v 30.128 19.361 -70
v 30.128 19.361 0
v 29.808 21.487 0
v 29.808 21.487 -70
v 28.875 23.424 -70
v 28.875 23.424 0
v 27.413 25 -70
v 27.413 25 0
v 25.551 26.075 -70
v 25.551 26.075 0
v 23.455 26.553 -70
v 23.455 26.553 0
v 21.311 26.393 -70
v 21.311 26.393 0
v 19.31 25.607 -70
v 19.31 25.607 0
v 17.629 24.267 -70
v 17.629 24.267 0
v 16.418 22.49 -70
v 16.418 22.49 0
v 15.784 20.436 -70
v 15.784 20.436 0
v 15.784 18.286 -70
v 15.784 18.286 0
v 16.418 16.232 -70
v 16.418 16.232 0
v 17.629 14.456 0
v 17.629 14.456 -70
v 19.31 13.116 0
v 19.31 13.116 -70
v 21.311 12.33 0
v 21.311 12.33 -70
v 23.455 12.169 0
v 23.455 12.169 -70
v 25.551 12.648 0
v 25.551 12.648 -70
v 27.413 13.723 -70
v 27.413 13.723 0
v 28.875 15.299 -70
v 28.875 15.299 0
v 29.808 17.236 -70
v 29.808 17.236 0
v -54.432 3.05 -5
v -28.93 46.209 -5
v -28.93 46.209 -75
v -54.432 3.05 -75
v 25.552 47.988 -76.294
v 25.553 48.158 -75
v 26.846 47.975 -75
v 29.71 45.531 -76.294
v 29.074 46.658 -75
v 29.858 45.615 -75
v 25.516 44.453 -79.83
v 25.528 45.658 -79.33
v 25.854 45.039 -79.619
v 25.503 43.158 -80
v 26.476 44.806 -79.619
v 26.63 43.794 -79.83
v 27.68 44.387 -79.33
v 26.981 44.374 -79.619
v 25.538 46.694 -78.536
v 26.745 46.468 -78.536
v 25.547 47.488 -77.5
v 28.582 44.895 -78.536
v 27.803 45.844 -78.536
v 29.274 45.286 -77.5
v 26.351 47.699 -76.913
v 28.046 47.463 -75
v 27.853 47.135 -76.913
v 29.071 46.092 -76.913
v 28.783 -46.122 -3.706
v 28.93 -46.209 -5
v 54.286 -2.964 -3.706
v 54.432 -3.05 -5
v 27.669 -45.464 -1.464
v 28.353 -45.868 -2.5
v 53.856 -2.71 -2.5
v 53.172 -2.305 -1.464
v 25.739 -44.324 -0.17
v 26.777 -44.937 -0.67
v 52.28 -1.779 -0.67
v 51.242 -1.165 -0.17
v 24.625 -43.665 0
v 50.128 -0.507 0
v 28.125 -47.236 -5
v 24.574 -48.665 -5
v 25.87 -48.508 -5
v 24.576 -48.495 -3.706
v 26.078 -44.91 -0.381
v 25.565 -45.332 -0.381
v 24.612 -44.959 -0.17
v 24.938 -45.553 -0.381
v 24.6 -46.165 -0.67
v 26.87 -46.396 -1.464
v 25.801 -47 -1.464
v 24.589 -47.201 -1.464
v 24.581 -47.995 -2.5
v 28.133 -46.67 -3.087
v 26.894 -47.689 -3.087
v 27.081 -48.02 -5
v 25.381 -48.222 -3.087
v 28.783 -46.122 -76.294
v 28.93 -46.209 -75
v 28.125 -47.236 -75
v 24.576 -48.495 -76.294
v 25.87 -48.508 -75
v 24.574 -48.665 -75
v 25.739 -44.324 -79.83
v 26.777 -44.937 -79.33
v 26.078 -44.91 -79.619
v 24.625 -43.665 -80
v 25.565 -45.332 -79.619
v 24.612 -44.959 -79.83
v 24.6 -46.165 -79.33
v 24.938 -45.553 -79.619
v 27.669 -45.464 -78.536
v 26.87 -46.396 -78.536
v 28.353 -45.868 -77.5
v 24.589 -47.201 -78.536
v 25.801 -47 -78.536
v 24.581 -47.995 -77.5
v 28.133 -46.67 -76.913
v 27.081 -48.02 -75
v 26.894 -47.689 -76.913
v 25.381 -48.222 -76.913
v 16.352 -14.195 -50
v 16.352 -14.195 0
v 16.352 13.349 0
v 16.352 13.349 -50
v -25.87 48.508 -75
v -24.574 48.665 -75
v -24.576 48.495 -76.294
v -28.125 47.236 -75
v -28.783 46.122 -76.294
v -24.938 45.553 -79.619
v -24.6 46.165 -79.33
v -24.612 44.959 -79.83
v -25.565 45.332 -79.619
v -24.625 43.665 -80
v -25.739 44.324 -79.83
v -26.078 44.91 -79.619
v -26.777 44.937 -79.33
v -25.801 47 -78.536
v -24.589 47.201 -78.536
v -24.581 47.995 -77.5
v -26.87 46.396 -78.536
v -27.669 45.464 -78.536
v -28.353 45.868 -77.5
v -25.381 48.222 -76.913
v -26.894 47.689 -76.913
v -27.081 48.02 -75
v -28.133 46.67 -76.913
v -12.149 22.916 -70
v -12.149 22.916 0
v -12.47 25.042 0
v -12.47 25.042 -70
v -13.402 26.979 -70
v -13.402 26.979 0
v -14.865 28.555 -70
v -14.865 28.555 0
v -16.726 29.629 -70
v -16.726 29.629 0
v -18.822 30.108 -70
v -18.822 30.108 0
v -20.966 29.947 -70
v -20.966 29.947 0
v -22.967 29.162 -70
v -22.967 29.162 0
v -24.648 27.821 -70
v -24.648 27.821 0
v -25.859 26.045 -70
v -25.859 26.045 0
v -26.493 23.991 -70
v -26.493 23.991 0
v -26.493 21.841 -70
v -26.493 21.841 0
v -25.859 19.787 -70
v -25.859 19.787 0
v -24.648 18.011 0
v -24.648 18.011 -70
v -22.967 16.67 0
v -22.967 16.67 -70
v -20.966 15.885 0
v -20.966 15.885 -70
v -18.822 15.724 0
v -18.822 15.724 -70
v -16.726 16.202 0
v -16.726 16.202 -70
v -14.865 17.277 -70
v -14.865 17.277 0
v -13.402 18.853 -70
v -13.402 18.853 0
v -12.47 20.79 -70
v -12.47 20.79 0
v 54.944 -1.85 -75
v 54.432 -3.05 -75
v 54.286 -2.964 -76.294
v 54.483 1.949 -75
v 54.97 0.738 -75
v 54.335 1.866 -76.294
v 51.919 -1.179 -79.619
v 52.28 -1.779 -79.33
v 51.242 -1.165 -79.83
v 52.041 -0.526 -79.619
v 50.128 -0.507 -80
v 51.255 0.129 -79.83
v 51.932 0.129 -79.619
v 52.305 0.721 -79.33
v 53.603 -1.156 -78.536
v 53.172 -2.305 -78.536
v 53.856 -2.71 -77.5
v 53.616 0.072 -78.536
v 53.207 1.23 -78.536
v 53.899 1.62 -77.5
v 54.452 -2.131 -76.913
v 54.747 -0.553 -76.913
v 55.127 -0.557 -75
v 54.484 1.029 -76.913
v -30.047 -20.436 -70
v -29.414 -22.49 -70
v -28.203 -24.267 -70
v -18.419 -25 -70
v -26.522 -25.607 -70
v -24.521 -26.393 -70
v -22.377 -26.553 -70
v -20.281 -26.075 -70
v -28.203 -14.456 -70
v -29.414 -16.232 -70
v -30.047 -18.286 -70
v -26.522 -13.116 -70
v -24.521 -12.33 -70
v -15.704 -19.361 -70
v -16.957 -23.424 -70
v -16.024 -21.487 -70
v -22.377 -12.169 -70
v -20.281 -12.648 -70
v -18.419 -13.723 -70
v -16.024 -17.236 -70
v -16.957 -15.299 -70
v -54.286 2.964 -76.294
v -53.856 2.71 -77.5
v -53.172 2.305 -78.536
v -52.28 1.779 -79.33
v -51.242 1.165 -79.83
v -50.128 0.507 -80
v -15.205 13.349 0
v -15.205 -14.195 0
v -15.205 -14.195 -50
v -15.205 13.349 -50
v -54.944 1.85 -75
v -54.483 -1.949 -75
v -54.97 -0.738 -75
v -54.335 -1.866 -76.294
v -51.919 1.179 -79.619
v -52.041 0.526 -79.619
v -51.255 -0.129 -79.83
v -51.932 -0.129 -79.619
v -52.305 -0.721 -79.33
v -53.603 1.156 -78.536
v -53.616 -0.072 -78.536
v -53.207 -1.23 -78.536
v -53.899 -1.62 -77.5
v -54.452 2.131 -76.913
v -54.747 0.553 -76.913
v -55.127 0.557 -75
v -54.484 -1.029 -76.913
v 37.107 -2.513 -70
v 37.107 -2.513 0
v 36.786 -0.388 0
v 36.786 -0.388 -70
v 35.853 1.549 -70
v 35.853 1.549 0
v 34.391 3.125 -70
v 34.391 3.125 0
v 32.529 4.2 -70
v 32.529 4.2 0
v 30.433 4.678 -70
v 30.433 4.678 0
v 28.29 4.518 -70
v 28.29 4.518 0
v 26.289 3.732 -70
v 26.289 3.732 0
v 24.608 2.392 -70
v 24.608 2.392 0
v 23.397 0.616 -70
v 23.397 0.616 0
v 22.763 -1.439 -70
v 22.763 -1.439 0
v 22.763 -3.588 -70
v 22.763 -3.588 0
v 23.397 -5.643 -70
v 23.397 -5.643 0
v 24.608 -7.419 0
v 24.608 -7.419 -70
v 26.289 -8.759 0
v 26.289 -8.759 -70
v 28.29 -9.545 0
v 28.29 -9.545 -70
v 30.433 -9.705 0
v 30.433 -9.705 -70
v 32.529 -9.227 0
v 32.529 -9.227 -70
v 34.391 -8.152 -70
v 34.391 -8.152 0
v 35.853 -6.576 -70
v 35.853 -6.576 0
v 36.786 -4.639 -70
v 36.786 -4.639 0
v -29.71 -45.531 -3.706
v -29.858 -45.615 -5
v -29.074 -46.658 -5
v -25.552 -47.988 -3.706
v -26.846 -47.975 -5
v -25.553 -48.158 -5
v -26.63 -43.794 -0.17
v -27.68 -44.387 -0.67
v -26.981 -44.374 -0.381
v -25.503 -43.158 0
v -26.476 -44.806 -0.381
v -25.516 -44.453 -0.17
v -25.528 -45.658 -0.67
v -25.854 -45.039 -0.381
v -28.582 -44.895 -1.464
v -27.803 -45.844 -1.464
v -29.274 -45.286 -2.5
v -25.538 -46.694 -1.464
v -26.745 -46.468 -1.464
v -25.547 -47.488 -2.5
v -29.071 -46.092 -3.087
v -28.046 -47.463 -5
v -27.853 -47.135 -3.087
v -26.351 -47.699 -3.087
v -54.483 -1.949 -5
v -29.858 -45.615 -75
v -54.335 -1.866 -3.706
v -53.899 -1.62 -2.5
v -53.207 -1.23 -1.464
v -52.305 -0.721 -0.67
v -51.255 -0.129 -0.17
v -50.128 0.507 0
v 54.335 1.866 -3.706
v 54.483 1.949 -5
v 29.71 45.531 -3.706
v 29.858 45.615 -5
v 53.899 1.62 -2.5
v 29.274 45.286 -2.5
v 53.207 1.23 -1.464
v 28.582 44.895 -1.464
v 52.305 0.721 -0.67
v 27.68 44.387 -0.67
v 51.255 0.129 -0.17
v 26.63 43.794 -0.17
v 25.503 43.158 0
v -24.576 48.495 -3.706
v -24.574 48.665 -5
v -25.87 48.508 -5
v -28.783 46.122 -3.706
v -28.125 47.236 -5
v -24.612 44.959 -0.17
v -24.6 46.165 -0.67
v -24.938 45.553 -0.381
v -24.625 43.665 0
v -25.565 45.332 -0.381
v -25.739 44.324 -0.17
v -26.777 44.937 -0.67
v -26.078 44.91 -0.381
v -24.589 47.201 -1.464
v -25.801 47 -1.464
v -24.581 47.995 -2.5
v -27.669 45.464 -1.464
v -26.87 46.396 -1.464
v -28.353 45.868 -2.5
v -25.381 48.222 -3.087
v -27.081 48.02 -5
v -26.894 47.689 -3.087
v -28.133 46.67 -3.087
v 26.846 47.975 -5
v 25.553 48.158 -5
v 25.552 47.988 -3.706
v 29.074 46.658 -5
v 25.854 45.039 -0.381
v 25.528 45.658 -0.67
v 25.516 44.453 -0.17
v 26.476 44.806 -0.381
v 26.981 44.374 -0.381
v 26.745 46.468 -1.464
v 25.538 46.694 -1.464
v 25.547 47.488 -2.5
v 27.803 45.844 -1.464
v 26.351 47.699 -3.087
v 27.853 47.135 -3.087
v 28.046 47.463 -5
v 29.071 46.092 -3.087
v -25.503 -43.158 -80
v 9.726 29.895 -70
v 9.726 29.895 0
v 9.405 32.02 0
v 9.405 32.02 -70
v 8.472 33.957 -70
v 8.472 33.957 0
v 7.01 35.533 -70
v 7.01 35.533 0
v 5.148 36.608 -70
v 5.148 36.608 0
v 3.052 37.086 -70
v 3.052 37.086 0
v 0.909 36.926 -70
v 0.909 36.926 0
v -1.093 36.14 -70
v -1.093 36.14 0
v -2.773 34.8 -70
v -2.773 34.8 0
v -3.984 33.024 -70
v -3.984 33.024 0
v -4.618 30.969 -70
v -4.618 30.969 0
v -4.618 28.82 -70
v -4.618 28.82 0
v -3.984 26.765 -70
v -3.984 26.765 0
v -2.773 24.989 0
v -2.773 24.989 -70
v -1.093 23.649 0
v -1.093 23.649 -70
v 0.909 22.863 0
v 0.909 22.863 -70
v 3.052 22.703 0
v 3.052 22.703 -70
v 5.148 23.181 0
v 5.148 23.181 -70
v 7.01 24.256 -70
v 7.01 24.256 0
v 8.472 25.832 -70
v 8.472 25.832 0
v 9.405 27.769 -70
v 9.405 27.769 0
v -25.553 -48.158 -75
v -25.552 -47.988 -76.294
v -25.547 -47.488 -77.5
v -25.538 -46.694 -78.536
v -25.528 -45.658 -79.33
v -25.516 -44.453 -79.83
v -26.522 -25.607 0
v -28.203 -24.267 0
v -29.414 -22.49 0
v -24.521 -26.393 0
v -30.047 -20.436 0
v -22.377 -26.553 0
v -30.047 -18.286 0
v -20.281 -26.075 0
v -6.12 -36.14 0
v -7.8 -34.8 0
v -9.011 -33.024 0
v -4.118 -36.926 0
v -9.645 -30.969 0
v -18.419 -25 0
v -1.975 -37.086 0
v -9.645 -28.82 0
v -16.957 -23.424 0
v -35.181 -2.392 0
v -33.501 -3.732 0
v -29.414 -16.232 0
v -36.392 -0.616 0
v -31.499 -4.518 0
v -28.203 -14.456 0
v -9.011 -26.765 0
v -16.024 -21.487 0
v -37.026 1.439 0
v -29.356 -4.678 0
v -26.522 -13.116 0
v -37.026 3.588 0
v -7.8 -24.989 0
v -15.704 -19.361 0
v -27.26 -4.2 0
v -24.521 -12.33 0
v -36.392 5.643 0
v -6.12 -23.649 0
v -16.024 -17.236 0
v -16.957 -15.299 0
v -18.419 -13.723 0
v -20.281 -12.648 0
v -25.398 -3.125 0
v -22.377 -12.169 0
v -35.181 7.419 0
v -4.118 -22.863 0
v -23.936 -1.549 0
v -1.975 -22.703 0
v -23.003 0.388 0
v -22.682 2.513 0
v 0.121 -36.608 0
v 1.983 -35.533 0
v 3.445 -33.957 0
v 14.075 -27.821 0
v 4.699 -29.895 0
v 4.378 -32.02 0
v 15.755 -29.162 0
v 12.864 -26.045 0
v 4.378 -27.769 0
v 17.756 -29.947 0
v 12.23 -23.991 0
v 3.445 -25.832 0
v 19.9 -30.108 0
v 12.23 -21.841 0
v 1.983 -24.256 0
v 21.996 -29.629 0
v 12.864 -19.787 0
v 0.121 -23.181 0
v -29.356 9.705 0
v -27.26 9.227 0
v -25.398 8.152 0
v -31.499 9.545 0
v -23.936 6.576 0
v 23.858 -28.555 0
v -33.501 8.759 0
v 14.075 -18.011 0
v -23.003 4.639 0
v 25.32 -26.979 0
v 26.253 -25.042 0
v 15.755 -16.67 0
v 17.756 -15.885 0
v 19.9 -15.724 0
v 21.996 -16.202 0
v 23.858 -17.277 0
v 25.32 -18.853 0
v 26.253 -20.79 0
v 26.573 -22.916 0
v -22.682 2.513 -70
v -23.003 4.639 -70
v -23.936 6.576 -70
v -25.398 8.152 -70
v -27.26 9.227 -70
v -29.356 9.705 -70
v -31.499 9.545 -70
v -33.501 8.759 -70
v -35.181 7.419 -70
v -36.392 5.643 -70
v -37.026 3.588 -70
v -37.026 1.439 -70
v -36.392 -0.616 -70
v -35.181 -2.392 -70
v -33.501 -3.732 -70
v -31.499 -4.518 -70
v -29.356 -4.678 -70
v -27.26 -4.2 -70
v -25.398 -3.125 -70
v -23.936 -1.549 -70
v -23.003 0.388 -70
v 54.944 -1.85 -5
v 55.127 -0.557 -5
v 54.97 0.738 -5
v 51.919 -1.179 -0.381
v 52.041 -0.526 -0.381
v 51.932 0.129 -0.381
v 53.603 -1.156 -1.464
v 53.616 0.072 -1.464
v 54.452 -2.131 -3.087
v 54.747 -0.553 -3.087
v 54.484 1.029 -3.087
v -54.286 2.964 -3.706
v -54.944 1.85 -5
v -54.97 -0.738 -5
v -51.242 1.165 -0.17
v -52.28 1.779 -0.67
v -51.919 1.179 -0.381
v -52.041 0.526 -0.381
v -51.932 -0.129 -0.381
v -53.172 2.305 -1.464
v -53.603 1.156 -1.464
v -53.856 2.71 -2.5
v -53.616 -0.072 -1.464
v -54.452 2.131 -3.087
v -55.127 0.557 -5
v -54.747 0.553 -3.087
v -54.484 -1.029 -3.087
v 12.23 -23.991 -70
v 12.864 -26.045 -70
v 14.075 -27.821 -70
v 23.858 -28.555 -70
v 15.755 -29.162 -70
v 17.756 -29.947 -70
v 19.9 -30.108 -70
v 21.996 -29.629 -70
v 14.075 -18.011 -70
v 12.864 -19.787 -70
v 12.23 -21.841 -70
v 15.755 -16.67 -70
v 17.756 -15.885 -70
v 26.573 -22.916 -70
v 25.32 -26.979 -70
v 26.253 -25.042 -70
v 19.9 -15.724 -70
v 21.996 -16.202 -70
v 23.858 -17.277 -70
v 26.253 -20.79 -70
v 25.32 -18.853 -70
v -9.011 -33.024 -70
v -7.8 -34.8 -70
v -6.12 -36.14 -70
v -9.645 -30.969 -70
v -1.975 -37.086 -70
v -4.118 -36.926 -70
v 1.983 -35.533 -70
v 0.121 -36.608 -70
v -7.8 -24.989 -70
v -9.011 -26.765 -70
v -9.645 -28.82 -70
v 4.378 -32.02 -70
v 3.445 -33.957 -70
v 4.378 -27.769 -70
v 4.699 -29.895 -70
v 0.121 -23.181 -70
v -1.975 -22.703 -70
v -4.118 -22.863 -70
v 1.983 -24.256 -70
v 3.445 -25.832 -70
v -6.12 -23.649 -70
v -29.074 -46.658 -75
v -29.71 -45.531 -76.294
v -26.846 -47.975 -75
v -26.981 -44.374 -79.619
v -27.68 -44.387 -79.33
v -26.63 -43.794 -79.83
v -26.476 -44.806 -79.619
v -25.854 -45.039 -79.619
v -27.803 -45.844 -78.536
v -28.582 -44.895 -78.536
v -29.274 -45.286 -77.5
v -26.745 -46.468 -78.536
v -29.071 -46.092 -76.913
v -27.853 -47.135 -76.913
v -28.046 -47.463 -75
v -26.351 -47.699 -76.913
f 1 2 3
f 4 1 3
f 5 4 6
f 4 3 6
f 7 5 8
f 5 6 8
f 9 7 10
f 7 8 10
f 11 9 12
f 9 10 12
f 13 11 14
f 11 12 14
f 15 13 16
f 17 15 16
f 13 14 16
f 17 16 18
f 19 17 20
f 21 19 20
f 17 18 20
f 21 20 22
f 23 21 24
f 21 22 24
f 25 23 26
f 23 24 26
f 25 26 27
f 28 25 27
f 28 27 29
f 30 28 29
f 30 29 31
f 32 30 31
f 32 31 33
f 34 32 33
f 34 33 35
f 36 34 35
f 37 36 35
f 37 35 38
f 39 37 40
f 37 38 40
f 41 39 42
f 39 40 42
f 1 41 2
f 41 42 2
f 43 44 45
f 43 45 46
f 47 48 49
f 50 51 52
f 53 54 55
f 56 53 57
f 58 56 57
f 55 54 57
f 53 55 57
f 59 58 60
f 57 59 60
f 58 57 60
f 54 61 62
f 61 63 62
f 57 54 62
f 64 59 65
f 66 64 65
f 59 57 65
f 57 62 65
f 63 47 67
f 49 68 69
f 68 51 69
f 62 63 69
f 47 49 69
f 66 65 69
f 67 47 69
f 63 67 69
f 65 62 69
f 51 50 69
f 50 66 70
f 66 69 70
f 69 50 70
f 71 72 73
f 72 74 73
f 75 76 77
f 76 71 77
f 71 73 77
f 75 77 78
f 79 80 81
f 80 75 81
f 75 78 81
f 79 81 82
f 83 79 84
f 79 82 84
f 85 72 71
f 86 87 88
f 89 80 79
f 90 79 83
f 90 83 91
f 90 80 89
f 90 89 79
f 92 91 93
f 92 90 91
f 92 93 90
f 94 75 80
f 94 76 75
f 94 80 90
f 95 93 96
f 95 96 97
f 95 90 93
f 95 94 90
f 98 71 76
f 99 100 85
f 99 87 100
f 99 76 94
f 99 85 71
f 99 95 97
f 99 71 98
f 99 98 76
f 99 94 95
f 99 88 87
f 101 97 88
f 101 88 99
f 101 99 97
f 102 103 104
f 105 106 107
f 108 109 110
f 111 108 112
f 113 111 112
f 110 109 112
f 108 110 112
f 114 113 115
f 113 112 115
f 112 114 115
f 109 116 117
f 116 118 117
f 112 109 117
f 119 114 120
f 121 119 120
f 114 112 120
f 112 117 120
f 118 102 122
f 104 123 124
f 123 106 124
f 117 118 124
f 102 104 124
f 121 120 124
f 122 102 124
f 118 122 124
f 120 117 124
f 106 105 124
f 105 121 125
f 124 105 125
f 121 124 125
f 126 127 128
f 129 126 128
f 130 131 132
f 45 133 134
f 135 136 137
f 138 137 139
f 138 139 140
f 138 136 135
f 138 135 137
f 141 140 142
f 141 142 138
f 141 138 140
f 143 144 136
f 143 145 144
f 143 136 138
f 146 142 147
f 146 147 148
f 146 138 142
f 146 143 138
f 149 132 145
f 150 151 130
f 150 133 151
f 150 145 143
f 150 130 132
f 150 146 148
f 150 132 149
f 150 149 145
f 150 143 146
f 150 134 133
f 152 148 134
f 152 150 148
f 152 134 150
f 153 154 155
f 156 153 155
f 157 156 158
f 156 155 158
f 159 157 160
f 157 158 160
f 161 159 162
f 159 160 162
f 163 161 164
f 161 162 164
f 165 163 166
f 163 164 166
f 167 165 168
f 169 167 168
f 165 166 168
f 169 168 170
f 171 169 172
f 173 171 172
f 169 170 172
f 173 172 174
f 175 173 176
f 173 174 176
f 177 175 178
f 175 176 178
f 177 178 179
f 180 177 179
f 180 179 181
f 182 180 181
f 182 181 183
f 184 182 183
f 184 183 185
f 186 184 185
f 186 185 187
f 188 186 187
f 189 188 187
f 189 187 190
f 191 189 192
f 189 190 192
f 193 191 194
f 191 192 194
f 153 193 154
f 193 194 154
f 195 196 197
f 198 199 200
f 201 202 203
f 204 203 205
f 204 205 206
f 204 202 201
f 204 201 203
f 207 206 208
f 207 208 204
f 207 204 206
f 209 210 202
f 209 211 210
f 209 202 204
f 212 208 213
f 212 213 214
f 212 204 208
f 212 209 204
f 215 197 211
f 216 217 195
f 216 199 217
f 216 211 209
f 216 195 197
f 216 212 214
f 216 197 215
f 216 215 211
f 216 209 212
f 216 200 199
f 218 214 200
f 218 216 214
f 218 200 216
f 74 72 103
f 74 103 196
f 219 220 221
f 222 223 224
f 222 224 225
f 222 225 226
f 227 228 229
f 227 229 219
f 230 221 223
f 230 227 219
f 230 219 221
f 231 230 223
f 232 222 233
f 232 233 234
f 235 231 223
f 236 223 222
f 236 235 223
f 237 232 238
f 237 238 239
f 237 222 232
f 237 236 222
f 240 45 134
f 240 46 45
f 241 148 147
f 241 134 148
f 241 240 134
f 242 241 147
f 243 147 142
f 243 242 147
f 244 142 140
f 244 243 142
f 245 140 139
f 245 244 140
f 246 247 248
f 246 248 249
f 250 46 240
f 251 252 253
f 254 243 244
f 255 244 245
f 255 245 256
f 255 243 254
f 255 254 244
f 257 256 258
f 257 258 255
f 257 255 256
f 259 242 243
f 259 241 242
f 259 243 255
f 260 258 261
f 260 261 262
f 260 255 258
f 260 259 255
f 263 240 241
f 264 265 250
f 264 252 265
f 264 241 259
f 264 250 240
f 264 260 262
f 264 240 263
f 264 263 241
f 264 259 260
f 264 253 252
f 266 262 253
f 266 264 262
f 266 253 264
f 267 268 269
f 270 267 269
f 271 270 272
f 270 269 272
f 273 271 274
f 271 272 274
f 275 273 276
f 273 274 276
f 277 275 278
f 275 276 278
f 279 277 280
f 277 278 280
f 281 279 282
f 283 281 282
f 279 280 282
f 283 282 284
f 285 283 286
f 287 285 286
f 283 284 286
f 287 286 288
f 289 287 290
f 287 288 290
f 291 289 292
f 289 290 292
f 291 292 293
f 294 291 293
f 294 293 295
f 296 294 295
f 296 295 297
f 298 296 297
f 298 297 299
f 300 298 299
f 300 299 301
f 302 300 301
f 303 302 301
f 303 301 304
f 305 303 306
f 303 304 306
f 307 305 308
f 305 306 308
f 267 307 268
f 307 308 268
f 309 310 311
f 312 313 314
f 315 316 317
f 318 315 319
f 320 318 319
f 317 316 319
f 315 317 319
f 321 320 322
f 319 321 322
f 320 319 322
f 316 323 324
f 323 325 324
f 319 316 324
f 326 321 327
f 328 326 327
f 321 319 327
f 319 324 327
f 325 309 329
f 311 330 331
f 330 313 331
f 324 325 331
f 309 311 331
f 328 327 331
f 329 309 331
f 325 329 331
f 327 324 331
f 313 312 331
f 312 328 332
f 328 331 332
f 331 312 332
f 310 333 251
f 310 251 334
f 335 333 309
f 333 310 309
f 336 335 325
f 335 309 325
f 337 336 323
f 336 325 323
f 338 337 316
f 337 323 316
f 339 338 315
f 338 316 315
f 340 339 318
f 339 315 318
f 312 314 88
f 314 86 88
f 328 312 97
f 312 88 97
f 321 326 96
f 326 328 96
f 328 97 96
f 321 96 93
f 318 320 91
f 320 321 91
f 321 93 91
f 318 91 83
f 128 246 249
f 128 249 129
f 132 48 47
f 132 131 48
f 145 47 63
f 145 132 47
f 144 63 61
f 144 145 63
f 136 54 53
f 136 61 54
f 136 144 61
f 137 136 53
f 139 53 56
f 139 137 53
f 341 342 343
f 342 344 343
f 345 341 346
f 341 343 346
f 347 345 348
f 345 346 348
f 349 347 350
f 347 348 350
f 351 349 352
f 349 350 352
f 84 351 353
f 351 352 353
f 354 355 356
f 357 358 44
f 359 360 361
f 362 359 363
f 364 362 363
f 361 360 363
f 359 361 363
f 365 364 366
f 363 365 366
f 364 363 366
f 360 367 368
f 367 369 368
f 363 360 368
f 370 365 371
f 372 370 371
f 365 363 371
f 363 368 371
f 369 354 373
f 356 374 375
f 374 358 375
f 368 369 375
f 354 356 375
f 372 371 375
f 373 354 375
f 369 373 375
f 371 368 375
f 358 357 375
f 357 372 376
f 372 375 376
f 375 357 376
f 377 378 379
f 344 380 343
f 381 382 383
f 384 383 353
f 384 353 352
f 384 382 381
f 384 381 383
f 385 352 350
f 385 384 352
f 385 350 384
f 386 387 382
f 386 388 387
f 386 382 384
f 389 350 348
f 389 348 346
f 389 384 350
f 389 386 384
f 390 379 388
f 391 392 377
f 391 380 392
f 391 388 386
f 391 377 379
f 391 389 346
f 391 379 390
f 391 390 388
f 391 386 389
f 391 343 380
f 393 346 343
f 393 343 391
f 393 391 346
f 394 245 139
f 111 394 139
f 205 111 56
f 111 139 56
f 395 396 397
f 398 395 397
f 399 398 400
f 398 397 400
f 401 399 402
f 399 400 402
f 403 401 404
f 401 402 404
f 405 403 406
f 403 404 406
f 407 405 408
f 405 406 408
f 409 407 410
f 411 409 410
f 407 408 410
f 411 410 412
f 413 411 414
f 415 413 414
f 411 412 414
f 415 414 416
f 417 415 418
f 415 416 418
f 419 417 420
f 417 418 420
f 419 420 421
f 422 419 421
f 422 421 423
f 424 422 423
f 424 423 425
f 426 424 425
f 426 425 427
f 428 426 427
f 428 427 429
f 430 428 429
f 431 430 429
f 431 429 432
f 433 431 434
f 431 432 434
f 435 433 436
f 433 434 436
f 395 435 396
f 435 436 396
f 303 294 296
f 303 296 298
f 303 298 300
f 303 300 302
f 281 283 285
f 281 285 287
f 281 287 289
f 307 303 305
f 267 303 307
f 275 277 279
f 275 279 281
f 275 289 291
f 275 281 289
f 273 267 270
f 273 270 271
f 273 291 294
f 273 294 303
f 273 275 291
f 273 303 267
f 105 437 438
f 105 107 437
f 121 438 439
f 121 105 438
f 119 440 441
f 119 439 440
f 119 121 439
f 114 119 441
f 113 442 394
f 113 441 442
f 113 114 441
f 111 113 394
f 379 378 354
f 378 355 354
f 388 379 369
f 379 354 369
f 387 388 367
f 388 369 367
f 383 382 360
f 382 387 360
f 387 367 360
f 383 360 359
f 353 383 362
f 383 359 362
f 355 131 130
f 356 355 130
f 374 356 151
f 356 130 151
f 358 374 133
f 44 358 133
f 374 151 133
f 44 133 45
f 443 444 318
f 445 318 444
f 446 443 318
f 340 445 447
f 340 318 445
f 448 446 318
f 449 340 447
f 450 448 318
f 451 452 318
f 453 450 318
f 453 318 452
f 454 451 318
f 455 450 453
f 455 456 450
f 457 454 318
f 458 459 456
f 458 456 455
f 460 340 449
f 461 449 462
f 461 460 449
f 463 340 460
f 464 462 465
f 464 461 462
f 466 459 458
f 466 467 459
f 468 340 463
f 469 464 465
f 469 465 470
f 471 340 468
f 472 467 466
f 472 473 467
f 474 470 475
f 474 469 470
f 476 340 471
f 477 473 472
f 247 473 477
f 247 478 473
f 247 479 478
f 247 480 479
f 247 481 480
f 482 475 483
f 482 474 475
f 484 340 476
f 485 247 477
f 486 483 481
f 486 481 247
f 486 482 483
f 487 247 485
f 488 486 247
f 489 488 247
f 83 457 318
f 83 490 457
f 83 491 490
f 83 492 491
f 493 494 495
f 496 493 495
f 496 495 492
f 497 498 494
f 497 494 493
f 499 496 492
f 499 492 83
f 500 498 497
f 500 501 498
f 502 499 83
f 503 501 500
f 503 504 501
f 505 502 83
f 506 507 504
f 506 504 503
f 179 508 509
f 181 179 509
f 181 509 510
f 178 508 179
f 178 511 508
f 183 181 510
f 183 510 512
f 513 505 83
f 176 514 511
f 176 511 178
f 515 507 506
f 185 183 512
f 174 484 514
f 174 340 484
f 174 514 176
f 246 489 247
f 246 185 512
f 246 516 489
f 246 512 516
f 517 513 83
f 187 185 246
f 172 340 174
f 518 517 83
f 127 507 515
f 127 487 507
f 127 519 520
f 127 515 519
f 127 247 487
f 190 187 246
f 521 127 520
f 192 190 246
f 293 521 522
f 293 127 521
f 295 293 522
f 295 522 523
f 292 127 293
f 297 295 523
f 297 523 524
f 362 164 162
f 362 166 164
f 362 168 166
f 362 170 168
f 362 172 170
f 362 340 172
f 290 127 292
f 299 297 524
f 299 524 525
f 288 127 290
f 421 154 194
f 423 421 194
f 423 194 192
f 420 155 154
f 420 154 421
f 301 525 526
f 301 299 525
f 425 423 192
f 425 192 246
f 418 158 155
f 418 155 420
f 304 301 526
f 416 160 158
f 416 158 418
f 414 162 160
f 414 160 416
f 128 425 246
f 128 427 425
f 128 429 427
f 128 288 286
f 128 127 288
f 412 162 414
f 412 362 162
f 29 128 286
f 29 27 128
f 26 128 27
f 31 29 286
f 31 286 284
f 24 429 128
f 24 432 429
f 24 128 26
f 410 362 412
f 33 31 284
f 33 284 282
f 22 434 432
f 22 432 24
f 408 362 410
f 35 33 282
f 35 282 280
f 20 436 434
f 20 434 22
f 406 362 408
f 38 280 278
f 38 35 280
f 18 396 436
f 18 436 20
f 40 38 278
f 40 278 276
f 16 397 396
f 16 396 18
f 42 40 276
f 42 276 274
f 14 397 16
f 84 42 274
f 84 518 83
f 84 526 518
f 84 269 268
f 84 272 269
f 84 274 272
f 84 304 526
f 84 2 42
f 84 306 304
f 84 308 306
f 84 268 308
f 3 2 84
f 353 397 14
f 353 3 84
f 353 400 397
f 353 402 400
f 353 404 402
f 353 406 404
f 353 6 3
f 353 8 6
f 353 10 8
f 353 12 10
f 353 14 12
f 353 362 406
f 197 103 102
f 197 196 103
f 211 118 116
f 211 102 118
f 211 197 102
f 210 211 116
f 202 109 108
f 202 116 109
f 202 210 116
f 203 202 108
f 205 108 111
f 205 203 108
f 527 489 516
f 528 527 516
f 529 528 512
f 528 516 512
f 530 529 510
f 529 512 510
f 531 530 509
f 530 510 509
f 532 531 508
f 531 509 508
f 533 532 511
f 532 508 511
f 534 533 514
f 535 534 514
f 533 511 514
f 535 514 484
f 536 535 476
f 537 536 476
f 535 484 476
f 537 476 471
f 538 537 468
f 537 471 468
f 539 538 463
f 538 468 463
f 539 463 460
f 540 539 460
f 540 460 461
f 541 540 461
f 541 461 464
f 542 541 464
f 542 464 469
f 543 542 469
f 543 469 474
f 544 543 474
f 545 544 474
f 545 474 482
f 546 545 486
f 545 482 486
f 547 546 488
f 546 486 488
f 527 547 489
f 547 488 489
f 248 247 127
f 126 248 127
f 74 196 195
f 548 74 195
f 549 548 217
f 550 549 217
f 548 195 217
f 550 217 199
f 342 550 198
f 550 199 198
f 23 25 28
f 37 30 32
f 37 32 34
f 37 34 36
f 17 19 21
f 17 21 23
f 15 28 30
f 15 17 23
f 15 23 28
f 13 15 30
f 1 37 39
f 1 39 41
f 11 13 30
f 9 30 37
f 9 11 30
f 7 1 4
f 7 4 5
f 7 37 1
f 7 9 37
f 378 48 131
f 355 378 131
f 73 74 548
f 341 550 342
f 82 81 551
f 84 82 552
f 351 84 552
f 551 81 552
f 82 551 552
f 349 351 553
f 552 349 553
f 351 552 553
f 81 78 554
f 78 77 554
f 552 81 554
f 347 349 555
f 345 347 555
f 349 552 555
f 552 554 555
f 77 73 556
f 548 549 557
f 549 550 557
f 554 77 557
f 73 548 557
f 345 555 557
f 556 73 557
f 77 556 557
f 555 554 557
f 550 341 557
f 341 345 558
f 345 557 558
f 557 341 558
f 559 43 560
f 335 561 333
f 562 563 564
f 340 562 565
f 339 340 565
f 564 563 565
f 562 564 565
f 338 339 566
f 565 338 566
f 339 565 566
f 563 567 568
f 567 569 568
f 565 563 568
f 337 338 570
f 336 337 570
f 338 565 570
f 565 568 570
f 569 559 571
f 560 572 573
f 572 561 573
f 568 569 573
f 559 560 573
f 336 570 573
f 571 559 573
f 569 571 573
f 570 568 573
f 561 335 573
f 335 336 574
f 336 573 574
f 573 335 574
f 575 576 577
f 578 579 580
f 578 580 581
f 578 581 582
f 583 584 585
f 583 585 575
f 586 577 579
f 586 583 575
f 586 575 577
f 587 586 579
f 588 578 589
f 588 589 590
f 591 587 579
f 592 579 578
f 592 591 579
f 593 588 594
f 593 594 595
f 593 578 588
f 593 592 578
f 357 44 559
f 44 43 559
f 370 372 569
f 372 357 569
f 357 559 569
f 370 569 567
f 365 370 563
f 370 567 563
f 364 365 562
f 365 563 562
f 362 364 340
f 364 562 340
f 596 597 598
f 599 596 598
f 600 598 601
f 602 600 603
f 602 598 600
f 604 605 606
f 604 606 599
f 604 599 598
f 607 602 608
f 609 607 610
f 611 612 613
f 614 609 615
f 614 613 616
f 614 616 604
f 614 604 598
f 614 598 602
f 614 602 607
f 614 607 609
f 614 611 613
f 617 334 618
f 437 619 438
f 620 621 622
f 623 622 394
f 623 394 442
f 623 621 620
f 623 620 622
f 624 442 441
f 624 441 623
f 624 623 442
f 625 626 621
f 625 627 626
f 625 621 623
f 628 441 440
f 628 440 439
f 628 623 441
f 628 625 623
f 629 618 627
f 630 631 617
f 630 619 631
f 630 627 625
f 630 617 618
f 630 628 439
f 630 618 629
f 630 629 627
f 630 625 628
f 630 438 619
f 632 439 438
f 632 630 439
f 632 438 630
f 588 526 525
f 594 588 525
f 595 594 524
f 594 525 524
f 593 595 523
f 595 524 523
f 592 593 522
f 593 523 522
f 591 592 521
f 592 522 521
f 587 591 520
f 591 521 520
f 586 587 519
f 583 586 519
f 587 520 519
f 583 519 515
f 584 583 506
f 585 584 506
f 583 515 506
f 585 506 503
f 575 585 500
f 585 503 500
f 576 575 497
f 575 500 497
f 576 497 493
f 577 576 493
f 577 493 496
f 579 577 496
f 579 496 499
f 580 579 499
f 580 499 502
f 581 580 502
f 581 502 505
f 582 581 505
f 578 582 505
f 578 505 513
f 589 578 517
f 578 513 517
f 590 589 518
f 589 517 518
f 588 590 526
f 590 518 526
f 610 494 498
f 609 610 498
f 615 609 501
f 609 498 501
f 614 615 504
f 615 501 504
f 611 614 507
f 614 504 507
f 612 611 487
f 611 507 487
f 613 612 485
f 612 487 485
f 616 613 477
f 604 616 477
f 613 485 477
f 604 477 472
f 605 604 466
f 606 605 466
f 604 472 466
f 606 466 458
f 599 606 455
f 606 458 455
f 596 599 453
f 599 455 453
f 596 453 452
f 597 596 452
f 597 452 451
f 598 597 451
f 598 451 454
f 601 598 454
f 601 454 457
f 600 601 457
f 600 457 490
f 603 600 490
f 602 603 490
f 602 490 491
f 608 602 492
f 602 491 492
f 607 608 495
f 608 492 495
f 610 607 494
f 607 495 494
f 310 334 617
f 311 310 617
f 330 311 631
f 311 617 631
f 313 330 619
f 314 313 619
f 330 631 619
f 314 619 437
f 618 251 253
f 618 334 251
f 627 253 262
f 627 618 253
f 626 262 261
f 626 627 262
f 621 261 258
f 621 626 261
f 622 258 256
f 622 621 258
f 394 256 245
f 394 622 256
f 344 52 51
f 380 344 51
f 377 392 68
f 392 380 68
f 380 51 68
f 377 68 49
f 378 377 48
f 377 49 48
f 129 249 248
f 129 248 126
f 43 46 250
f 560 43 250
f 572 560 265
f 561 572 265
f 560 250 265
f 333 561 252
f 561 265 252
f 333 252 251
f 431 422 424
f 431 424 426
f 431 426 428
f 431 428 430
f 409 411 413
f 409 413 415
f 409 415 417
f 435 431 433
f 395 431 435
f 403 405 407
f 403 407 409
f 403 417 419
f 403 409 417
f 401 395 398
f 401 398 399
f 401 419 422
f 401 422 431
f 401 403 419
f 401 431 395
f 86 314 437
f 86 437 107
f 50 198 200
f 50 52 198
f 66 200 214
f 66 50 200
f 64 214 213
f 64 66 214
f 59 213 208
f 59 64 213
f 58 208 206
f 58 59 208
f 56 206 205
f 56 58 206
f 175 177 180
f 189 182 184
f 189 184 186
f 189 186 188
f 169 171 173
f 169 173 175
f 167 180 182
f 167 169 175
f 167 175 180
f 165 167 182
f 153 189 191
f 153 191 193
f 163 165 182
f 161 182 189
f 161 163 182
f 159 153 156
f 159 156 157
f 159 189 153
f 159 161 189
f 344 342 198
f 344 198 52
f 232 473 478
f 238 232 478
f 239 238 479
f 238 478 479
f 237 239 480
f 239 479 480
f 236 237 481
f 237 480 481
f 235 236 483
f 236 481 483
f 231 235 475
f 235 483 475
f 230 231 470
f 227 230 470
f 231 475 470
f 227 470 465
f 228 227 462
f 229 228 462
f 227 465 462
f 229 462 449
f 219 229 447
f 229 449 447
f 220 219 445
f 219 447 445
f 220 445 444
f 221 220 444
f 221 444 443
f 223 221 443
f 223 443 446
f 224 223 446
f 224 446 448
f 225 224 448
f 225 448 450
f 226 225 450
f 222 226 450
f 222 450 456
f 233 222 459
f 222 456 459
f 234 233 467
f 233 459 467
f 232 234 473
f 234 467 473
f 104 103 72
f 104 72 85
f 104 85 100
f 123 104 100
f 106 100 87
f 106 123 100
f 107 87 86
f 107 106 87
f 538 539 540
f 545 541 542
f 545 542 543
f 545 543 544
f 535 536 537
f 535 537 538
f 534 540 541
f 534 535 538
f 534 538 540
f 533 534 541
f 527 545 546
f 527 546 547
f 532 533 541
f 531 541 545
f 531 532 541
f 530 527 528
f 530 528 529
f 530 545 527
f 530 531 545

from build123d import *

# Parameters (mm, degrees)
F1_DEPTH = 80
F2_R     = 5
F3_R     = 7.212023
F4_DEPTH = 50
F5_DEPTH = 70
F6_W     = 31.557379
F6_H     = 27.543242
F7_DEPTH = 50


with BuildPart() as f1:
    # F0 (on Top) → F1 (new body)
    with BuildSketch(Plane.XY):
        Polygon((27.461036, -48.6942), (55.900933, -0.565146), (28.439897, 48.129055), (-27.461036, 48.6942), (-55.900933, 0.565146), (-28.439897, -48.129055), align=None)
    extrude(amount=-F1_DEPTH)

    # F2
    f2_edges = [f1.edges().sort_by_distance(p)[0] for p in [
        (55.900933, -0.565146, -40),
        (27.461036, -48.6942, -40),
        (41.680984, -24.629673, -80),
        (41.680984, -24.629673, 0),
        (-0.48943, -48.411628, 0),
        (-0.48943, -48.411628, -80),
        (-28.439897, -48.129055, -40),
        (42.170415, 23.781955, -80),
        (42.170415, 23.781955, 0),
        (28.439897, 48.129055, -40),
        (0.48943, 48.411628, 0),
        (-41.680984, 24.629673, 0),
        (-42.170415, -23.781955, 0),
        (0.48943, 48.411628, -80),
        (-41.680984, 24.629673, -80),
        (-42.170415, -23.781955, -80),
        (-55.900933, 0.565146, -40),
        (-27.461036, 48.6942, -40),
    ]]
    fillet(f2_edges, radius=F2_R)

    # F3 (on face) → F4 (join)
    with BuildSketch(Plane.XY):
        with Locations((-19.36131, 22.915926)):
            Circle(F3_R)
        with Locations((-29.89452, 2.513494)):
            Circle(F3_R)
        with Locations((-22.915926, -19.36131)):
            Circle(F3_R)
        with Locations((-2.513494, -29.89452)):
            Circle(F3_R)
        with Locations((19.36131, -22.915926)):
            Circle(F3_R)
        with Locations((29.89452, -2.513494)):
            Circle(F3_R)
        with Locations((22.915926, 19.36131)):
            Circle(F3_R)
        with Locations((2.513494, 29.89452)):
            Circle(F3_R)
    extrude(amount=-F4_DEPTH)

    # F3 (on face) → F5 (cut)
    with BuildSketch(Plane.XY):
        with Locations((-29.89452, 2.513494)):
            Circle(F3_R)
        with Locations((-22.915926, -19.36131)):
            Circle(F3_R)
        with Locations((19.36131, -22.915926)):
            Circle(F3_R)
        with Locations((2.513494, 29.89452)):
            Circle(F3_R)
        with Locations((-2.513494, -29.89452)):
            Circle(F3_R)
        with Locations((-19.36131, 22.915926)):
            Circle(F3_R)
        with Locations((22.915926, 19.36131)):
            Circle(F3_R)
        with Locations((29.89452, -2.513494)):
            Circle(F3_R)
    extrude(amount=-F5_DEPTH, mode=Mode.SUBTRACT)

    # F6 (on face) → F7 (cut)
    with BuildSketch(Plane.XY):
        with Locations((0.573771, -0.422957)):
            Rectangle(F6_W, F6_H)
    extrude(amount=-F7_DEPTH, mode=Mode.SUBTRACT)


solid = f1.part
